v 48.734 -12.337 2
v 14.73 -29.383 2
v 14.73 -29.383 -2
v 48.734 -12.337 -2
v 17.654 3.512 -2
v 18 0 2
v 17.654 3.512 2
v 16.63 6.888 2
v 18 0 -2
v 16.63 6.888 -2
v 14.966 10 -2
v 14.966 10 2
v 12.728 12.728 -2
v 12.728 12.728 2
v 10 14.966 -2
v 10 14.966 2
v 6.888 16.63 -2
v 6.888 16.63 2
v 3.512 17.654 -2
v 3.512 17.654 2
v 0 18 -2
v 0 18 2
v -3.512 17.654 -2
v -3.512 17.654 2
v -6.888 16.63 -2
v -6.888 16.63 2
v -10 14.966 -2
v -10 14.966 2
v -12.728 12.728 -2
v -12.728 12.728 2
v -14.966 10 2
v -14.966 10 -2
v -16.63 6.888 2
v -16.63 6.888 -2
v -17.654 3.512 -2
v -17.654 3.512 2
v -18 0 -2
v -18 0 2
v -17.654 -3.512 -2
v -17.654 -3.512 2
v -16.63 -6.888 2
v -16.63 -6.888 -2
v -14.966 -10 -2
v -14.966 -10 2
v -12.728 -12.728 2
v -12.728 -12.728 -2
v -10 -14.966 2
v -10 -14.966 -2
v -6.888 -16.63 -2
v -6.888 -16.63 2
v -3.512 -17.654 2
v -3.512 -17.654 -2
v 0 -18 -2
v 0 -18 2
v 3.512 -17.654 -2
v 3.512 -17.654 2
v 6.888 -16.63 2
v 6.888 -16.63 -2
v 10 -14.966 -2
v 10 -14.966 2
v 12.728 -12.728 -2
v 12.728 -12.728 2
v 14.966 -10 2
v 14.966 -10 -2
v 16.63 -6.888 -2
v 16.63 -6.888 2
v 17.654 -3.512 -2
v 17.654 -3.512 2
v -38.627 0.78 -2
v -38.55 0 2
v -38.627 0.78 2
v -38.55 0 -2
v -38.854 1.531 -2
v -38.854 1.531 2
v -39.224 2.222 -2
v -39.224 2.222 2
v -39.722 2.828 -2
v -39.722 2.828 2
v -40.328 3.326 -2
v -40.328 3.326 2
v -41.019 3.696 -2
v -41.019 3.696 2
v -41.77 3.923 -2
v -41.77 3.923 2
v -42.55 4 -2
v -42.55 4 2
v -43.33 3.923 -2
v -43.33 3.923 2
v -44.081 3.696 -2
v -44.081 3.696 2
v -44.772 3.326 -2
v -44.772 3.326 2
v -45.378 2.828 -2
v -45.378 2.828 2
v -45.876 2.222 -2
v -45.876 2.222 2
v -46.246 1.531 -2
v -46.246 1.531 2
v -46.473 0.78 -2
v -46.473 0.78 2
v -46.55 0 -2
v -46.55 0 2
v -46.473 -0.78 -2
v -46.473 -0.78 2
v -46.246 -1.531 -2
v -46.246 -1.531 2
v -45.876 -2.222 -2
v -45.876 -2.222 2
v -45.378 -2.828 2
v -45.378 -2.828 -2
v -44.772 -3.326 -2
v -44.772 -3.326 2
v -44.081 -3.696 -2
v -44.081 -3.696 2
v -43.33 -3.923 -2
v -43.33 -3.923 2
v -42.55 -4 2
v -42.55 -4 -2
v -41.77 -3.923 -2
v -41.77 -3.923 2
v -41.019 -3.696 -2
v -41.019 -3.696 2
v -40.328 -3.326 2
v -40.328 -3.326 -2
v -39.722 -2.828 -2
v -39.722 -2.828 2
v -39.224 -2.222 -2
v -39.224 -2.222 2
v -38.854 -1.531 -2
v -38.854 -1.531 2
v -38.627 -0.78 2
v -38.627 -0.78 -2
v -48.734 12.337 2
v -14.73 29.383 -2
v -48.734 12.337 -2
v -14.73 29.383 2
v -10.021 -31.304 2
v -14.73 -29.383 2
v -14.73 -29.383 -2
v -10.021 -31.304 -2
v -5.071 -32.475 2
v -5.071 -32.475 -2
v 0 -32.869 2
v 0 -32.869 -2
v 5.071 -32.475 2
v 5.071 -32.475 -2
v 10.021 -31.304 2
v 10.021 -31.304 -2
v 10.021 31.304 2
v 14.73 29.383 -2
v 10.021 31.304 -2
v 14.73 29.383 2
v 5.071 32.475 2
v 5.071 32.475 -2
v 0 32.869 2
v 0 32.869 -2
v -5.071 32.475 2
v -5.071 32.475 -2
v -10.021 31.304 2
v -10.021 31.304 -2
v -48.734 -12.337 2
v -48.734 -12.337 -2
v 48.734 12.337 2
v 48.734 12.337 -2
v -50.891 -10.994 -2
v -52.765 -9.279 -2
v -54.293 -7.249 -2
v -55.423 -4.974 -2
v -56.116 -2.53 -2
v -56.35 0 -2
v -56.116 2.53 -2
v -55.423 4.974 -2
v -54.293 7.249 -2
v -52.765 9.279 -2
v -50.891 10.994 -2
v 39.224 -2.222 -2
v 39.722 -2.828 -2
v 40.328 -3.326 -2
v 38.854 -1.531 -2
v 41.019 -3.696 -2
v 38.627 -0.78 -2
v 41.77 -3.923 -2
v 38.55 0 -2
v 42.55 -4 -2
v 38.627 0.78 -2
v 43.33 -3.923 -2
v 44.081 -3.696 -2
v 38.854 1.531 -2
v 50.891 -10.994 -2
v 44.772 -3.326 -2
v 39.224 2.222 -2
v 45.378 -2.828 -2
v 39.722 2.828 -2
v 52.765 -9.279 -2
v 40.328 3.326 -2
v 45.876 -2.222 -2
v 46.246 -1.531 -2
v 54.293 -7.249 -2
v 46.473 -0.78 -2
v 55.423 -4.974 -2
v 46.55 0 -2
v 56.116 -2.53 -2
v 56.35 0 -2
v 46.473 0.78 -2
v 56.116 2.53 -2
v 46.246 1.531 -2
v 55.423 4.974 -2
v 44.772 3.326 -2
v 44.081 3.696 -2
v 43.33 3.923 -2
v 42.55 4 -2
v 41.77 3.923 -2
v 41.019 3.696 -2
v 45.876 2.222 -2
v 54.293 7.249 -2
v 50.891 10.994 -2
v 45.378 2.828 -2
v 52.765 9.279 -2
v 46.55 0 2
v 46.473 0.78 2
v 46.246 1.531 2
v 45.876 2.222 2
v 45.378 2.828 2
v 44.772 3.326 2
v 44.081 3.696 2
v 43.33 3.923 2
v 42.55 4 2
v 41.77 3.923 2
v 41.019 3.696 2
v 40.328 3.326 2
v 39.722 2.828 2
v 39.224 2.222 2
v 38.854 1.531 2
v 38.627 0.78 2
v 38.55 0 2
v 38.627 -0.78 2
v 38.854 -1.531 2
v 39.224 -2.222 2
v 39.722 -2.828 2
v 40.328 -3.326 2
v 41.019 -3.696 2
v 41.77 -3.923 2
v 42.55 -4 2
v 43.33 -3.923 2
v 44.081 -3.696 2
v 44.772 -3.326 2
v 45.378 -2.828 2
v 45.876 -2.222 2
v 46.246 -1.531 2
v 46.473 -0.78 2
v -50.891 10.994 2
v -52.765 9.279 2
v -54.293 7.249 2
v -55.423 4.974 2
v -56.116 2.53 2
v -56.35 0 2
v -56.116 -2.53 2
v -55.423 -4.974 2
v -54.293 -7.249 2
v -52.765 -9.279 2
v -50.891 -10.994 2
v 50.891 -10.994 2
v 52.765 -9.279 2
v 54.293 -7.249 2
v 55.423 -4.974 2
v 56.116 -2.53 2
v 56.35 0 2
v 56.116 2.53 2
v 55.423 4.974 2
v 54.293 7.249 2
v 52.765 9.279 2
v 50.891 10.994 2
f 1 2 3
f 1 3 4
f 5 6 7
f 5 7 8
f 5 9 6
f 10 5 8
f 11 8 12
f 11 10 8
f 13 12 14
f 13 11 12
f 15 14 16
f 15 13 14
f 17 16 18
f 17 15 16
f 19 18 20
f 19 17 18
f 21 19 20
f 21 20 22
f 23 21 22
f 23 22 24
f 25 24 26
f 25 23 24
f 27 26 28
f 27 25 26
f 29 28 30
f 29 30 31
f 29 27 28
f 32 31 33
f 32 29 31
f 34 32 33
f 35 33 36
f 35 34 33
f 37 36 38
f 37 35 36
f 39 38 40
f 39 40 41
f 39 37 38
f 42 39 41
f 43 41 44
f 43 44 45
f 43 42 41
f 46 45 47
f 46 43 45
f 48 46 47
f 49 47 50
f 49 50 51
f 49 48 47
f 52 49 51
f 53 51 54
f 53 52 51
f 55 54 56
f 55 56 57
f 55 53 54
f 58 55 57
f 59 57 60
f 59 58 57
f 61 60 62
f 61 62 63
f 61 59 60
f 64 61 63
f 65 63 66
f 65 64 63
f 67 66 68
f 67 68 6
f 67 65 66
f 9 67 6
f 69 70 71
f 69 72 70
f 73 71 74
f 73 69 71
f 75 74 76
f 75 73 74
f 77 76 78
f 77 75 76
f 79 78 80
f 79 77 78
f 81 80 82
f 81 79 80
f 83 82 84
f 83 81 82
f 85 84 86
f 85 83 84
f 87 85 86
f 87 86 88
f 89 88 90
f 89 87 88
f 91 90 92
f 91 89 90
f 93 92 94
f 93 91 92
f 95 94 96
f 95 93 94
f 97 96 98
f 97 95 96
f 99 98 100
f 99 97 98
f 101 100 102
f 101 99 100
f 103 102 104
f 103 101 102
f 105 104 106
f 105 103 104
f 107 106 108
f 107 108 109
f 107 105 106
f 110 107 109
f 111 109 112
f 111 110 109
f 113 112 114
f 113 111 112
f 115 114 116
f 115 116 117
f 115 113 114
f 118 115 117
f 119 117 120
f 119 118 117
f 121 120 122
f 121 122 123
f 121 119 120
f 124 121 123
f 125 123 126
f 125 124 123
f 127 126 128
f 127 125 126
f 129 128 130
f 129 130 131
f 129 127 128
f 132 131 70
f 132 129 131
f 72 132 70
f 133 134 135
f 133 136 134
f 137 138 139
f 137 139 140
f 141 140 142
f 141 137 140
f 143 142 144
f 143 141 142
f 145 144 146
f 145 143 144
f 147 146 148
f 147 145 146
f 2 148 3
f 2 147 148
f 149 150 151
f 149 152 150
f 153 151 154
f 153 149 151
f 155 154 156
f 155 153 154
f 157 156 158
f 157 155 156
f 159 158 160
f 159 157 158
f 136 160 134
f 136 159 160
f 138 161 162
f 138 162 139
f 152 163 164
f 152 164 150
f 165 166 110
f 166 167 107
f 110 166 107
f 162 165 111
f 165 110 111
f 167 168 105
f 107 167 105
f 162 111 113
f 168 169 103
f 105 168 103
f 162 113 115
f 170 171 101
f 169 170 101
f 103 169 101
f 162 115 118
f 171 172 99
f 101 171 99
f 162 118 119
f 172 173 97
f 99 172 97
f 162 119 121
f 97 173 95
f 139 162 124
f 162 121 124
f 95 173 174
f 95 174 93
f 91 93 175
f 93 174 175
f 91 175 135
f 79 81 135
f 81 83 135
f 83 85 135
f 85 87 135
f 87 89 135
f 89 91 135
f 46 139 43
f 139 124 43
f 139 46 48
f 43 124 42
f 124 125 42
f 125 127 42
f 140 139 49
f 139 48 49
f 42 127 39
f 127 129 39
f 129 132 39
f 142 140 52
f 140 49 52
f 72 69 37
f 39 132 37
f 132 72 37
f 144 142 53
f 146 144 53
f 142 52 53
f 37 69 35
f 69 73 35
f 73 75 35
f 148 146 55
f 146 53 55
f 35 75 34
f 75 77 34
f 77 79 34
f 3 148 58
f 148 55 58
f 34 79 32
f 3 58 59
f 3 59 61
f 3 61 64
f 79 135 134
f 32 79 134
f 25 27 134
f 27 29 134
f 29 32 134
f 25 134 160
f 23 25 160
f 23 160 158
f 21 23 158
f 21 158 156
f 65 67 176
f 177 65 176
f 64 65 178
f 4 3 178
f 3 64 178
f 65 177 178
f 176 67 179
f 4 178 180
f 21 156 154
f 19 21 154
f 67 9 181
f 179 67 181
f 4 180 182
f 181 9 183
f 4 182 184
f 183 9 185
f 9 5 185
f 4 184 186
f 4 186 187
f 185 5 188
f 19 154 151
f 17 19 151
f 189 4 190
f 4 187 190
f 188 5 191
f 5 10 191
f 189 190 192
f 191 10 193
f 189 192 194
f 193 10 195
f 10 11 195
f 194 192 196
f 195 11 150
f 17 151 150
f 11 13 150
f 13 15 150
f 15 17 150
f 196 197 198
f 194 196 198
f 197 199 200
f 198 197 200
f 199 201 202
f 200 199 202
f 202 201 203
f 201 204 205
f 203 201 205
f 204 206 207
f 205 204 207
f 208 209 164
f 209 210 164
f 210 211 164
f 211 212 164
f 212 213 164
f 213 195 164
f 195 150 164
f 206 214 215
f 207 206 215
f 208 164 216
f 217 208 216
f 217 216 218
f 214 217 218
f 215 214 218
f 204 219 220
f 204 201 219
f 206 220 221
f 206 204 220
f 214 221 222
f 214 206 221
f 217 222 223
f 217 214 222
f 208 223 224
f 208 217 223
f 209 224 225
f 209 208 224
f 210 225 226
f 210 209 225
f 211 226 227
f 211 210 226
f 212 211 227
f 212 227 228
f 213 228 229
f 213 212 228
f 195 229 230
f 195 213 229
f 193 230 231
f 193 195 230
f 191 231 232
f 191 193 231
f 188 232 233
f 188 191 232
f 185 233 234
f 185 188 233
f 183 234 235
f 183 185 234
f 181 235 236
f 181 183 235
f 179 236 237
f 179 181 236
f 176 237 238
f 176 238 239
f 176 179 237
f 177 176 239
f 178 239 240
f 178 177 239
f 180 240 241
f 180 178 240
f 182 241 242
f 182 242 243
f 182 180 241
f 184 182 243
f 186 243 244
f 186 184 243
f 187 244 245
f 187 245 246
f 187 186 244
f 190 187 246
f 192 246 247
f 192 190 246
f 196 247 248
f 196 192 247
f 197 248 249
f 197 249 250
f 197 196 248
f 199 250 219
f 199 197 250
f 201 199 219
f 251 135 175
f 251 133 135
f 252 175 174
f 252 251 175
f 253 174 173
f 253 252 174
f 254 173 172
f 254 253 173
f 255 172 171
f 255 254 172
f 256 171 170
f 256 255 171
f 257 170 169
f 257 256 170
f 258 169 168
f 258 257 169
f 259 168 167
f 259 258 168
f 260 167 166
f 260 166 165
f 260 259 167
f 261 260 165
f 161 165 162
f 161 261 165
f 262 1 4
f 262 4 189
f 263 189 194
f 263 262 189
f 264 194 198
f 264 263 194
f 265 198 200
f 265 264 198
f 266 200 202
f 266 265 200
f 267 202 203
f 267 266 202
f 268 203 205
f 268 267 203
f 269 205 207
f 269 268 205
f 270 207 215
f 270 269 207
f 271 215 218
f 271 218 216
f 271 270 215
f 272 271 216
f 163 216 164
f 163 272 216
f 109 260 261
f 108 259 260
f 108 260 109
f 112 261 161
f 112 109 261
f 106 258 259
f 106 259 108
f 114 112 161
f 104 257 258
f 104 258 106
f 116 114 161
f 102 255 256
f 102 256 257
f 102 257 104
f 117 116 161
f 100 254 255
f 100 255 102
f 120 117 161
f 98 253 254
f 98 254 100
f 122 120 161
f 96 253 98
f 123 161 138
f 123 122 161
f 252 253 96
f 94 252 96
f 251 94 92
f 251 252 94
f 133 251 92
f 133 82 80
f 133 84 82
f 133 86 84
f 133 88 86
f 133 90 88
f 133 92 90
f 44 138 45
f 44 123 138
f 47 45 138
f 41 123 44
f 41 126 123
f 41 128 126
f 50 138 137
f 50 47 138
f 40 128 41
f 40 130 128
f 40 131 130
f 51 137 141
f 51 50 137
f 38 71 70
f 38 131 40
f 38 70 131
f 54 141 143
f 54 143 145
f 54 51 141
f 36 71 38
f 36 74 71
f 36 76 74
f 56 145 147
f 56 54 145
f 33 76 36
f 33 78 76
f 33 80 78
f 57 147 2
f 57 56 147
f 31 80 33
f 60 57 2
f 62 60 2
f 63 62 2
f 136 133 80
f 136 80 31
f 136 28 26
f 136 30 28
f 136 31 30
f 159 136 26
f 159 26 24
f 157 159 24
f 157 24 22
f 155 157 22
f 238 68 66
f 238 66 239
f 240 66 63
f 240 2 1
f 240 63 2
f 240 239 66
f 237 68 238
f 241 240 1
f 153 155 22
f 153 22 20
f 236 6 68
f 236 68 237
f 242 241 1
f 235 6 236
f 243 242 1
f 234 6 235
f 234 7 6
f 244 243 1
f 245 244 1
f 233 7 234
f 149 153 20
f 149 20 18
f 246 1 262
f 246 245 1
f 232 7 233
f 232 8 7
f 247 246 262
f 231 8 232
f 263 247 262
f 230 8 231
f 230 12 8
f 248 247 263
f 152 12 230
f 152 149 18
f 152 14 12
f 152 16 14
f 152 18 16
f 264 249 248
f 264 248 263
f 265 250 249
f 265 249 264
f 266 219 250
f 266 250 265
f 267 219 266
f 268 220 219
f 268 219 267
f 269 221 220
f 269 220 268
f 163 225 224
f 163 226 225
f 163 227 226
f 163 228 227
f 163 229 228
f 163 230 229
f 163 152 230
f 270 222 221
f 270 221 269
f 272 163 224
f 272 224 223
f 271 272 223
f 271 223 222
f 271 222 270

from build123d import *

# Parameters (mm, degrees)
F0_R     = 4
F0_R_2   = 18
F1_DEPTH = 2


with BuildPart() as f1:
    # F0 (on Top) → F1 (new body, symmetric)
    with BuildSketch(Plane.XY):
        with BuildLine():
            ThreePointArc((-31.732280933, 8.5683694007), (-39.5639115572, 13.473057404), (-48.7344588715, 12.3366311636))
            ThreePointArc((-48.7344588715, 12.3366311636), (-56.35, 0), (-48.7344588715, -12.3366311636))
            ThreePointArc((-48.7344588715, -12.3366311636), (-39.5639115572, -13.473057404), (-31.732280933, -8.5683694007))
            ThreePointArc((-31.732280933, -8.5683694007), (-32.8687481872, 0), (-31.732280933, 8.5683694007))
        make_face()
        with Locations((-42.55, 0)):
            Circle(F0_R, mode=Mode.SUBTRACT)
        with BuildLine():
            ThreePointArc((-28.75, 0), (-29.5168782879, 4.5362692201), (-31.732280933, 8.5683694007))
            ThreePointArc((-31.732280933, 8.5683694007), (-32.8687481872, 0), (-31.732280933, -8.5683694007))
            ThreePointArc((-31.732280933, -8.5683694007), (-29.5168782879, -4.5362692201), (-28.75, 0))
        make_face()
        with BuildLine():
            ThreePointArc((14.7301029944, 29.3833060286), (0, 32.8687481872), (-14.7301029944, 29.3833060286))
            ThreePointArc((-14.7301029944, 29.3833060286), (-25.455916341, 20.7930500561), (-31.732280933, 8.5683694007))
            ThreePointArc((-31.732280933, 8.5683694007), (-29.5168782879, 4.5362692201), (-28.75, 0))
            ThreePointArc((-28.75, 0), (-29.5168782879, -4.5362692201), (-31.732280933, -8.5683694007))
            ThreePointArc((-31.732280933, -8.5683694007), (-25.455916341, -20.7930500561), (-14.7301029944, -29.3833060286))
            ThreePointArc((-14.7301029944, -29.3833060286), (0, -32.8687481872), (14.7301029944, -29.3833060286))
            ThreePointArc((14.7301029944, -29.3833060286), (25.455916341, -20.7930500561), (31.732280933, -8.5683694007))
            ThreePointArc((31.732280933, -8.5683694007), (28.75, 0), (31.732280933, 8.5683694007))
            ThreePointArc((31.732280933, 8.5683694007), (25.455916341, 20.7930500561), (14.7301029944, 29.3833060286))
        make_face()
        Circle(F0_R_2, mode=Mode.SUBTRACT)
        with BuildLine():
            Line((-14.7301029944, 29.3833060286), (-48.7344588715, 12.3366311636))
            ThreePointArc((-48.7344588715, 12.3366311636), (-39.5639115572, 13.473057404), (-31.732280933, 8.5683694007))
            ThreePointArc((-31.732280933, 8.5683694007), (-25.455916341, 20.7930500561), (-14.7301029944, 29.3833060286))
        make_face()
        with BuildLine():
            ThreePointArc((-31.732280933, -8.5683694007), (-39.5639115572, -13.473057404), (-48.7344588715, -12.3366311636))
            Line((-48.7344588715, -12.3366311636), (-14.7301029944, -29.3833060286))
            ThreePointArc((-14.7301029944, -29.3833060286), (-25.455916341, -20.7930500561), (-31.732280933, -8.5683694007))
        make_face()
        with BuildLine():
            ThreePointArc((32.8687481872, 0), (32.5833926931, 4.3217042936), (31.732280933, 8.5683694007))
            ThreePointArc((31.732280933, 8.5683694007), (28.75, 0), (31.732280933, -8.5683694007))
            ThreePointArc((31.732280933, -8.5683694007), (32.5833926931, -4.3217042936), (32.8687481872, 0))
        make_face()
        with BuildLine():
            ThreePointArc((31.732280933, -8.5683694007), (25.455916341, -20.7930500561), (14.7301029944, -29.3833060286))
            Line((14.7301029944, -29.3833060286), (48.7344588715, -12.3366311636))
            ThreePointArc((48.7344588715, -12.3366311636), (39.5639115572, -13.473057404), (31.732280933, -8.5683694007))
        make_face()
        with BuildLine():
            ThreePointArc((48.7344588715, 12.3366311636), (39.5639115572, 13.473057404), (31.732280933, 8.5683694007))
            ThreePointArc((31.732280933, 8.5683694007), (32.5833926931, 4.3217042936), (32.8687481872, 0))
            ThreePointArc((32.8687481872, 0), (32.5833926931, -4.3217042936), (31.732280933, -8.5683694007))
            ThreePointArc((31.732280933, -8.5683694007), (39.5639115572, -13.473057404), (48.7344588715, -12.3366311636))
            ThreePointArc((48.7344588715, -12.3366311636), (54.2927750644, -7.2489470812), (56.35, 0))
            ThreePointArc((56.35, 0), (54.2927750644, 7.2489470812), (48.7344588715, 12.3366311636))
        make_face()
        with Locations((42.55, 0)):
            Circle(F0_R, mode=Mode.SUBTRACT)
        with BuildLine():
            Line((48.7344588715, 12.3366311636), (14.7301029944, 29.3833060286))
            ThreePointArc((14.7301029944, 29.3833060286), (25.455916341, 20.7930500561), (31.732280933, 8.5683694007))
            ThreePointArc((31.732280933, 8.5683694007), (39.5639115572, 13.473057404), (48.7344588715, 12.3366311636))
        make_face()
    extrude(amount=F1_DEPTH, both=True)


solid = f1.part
